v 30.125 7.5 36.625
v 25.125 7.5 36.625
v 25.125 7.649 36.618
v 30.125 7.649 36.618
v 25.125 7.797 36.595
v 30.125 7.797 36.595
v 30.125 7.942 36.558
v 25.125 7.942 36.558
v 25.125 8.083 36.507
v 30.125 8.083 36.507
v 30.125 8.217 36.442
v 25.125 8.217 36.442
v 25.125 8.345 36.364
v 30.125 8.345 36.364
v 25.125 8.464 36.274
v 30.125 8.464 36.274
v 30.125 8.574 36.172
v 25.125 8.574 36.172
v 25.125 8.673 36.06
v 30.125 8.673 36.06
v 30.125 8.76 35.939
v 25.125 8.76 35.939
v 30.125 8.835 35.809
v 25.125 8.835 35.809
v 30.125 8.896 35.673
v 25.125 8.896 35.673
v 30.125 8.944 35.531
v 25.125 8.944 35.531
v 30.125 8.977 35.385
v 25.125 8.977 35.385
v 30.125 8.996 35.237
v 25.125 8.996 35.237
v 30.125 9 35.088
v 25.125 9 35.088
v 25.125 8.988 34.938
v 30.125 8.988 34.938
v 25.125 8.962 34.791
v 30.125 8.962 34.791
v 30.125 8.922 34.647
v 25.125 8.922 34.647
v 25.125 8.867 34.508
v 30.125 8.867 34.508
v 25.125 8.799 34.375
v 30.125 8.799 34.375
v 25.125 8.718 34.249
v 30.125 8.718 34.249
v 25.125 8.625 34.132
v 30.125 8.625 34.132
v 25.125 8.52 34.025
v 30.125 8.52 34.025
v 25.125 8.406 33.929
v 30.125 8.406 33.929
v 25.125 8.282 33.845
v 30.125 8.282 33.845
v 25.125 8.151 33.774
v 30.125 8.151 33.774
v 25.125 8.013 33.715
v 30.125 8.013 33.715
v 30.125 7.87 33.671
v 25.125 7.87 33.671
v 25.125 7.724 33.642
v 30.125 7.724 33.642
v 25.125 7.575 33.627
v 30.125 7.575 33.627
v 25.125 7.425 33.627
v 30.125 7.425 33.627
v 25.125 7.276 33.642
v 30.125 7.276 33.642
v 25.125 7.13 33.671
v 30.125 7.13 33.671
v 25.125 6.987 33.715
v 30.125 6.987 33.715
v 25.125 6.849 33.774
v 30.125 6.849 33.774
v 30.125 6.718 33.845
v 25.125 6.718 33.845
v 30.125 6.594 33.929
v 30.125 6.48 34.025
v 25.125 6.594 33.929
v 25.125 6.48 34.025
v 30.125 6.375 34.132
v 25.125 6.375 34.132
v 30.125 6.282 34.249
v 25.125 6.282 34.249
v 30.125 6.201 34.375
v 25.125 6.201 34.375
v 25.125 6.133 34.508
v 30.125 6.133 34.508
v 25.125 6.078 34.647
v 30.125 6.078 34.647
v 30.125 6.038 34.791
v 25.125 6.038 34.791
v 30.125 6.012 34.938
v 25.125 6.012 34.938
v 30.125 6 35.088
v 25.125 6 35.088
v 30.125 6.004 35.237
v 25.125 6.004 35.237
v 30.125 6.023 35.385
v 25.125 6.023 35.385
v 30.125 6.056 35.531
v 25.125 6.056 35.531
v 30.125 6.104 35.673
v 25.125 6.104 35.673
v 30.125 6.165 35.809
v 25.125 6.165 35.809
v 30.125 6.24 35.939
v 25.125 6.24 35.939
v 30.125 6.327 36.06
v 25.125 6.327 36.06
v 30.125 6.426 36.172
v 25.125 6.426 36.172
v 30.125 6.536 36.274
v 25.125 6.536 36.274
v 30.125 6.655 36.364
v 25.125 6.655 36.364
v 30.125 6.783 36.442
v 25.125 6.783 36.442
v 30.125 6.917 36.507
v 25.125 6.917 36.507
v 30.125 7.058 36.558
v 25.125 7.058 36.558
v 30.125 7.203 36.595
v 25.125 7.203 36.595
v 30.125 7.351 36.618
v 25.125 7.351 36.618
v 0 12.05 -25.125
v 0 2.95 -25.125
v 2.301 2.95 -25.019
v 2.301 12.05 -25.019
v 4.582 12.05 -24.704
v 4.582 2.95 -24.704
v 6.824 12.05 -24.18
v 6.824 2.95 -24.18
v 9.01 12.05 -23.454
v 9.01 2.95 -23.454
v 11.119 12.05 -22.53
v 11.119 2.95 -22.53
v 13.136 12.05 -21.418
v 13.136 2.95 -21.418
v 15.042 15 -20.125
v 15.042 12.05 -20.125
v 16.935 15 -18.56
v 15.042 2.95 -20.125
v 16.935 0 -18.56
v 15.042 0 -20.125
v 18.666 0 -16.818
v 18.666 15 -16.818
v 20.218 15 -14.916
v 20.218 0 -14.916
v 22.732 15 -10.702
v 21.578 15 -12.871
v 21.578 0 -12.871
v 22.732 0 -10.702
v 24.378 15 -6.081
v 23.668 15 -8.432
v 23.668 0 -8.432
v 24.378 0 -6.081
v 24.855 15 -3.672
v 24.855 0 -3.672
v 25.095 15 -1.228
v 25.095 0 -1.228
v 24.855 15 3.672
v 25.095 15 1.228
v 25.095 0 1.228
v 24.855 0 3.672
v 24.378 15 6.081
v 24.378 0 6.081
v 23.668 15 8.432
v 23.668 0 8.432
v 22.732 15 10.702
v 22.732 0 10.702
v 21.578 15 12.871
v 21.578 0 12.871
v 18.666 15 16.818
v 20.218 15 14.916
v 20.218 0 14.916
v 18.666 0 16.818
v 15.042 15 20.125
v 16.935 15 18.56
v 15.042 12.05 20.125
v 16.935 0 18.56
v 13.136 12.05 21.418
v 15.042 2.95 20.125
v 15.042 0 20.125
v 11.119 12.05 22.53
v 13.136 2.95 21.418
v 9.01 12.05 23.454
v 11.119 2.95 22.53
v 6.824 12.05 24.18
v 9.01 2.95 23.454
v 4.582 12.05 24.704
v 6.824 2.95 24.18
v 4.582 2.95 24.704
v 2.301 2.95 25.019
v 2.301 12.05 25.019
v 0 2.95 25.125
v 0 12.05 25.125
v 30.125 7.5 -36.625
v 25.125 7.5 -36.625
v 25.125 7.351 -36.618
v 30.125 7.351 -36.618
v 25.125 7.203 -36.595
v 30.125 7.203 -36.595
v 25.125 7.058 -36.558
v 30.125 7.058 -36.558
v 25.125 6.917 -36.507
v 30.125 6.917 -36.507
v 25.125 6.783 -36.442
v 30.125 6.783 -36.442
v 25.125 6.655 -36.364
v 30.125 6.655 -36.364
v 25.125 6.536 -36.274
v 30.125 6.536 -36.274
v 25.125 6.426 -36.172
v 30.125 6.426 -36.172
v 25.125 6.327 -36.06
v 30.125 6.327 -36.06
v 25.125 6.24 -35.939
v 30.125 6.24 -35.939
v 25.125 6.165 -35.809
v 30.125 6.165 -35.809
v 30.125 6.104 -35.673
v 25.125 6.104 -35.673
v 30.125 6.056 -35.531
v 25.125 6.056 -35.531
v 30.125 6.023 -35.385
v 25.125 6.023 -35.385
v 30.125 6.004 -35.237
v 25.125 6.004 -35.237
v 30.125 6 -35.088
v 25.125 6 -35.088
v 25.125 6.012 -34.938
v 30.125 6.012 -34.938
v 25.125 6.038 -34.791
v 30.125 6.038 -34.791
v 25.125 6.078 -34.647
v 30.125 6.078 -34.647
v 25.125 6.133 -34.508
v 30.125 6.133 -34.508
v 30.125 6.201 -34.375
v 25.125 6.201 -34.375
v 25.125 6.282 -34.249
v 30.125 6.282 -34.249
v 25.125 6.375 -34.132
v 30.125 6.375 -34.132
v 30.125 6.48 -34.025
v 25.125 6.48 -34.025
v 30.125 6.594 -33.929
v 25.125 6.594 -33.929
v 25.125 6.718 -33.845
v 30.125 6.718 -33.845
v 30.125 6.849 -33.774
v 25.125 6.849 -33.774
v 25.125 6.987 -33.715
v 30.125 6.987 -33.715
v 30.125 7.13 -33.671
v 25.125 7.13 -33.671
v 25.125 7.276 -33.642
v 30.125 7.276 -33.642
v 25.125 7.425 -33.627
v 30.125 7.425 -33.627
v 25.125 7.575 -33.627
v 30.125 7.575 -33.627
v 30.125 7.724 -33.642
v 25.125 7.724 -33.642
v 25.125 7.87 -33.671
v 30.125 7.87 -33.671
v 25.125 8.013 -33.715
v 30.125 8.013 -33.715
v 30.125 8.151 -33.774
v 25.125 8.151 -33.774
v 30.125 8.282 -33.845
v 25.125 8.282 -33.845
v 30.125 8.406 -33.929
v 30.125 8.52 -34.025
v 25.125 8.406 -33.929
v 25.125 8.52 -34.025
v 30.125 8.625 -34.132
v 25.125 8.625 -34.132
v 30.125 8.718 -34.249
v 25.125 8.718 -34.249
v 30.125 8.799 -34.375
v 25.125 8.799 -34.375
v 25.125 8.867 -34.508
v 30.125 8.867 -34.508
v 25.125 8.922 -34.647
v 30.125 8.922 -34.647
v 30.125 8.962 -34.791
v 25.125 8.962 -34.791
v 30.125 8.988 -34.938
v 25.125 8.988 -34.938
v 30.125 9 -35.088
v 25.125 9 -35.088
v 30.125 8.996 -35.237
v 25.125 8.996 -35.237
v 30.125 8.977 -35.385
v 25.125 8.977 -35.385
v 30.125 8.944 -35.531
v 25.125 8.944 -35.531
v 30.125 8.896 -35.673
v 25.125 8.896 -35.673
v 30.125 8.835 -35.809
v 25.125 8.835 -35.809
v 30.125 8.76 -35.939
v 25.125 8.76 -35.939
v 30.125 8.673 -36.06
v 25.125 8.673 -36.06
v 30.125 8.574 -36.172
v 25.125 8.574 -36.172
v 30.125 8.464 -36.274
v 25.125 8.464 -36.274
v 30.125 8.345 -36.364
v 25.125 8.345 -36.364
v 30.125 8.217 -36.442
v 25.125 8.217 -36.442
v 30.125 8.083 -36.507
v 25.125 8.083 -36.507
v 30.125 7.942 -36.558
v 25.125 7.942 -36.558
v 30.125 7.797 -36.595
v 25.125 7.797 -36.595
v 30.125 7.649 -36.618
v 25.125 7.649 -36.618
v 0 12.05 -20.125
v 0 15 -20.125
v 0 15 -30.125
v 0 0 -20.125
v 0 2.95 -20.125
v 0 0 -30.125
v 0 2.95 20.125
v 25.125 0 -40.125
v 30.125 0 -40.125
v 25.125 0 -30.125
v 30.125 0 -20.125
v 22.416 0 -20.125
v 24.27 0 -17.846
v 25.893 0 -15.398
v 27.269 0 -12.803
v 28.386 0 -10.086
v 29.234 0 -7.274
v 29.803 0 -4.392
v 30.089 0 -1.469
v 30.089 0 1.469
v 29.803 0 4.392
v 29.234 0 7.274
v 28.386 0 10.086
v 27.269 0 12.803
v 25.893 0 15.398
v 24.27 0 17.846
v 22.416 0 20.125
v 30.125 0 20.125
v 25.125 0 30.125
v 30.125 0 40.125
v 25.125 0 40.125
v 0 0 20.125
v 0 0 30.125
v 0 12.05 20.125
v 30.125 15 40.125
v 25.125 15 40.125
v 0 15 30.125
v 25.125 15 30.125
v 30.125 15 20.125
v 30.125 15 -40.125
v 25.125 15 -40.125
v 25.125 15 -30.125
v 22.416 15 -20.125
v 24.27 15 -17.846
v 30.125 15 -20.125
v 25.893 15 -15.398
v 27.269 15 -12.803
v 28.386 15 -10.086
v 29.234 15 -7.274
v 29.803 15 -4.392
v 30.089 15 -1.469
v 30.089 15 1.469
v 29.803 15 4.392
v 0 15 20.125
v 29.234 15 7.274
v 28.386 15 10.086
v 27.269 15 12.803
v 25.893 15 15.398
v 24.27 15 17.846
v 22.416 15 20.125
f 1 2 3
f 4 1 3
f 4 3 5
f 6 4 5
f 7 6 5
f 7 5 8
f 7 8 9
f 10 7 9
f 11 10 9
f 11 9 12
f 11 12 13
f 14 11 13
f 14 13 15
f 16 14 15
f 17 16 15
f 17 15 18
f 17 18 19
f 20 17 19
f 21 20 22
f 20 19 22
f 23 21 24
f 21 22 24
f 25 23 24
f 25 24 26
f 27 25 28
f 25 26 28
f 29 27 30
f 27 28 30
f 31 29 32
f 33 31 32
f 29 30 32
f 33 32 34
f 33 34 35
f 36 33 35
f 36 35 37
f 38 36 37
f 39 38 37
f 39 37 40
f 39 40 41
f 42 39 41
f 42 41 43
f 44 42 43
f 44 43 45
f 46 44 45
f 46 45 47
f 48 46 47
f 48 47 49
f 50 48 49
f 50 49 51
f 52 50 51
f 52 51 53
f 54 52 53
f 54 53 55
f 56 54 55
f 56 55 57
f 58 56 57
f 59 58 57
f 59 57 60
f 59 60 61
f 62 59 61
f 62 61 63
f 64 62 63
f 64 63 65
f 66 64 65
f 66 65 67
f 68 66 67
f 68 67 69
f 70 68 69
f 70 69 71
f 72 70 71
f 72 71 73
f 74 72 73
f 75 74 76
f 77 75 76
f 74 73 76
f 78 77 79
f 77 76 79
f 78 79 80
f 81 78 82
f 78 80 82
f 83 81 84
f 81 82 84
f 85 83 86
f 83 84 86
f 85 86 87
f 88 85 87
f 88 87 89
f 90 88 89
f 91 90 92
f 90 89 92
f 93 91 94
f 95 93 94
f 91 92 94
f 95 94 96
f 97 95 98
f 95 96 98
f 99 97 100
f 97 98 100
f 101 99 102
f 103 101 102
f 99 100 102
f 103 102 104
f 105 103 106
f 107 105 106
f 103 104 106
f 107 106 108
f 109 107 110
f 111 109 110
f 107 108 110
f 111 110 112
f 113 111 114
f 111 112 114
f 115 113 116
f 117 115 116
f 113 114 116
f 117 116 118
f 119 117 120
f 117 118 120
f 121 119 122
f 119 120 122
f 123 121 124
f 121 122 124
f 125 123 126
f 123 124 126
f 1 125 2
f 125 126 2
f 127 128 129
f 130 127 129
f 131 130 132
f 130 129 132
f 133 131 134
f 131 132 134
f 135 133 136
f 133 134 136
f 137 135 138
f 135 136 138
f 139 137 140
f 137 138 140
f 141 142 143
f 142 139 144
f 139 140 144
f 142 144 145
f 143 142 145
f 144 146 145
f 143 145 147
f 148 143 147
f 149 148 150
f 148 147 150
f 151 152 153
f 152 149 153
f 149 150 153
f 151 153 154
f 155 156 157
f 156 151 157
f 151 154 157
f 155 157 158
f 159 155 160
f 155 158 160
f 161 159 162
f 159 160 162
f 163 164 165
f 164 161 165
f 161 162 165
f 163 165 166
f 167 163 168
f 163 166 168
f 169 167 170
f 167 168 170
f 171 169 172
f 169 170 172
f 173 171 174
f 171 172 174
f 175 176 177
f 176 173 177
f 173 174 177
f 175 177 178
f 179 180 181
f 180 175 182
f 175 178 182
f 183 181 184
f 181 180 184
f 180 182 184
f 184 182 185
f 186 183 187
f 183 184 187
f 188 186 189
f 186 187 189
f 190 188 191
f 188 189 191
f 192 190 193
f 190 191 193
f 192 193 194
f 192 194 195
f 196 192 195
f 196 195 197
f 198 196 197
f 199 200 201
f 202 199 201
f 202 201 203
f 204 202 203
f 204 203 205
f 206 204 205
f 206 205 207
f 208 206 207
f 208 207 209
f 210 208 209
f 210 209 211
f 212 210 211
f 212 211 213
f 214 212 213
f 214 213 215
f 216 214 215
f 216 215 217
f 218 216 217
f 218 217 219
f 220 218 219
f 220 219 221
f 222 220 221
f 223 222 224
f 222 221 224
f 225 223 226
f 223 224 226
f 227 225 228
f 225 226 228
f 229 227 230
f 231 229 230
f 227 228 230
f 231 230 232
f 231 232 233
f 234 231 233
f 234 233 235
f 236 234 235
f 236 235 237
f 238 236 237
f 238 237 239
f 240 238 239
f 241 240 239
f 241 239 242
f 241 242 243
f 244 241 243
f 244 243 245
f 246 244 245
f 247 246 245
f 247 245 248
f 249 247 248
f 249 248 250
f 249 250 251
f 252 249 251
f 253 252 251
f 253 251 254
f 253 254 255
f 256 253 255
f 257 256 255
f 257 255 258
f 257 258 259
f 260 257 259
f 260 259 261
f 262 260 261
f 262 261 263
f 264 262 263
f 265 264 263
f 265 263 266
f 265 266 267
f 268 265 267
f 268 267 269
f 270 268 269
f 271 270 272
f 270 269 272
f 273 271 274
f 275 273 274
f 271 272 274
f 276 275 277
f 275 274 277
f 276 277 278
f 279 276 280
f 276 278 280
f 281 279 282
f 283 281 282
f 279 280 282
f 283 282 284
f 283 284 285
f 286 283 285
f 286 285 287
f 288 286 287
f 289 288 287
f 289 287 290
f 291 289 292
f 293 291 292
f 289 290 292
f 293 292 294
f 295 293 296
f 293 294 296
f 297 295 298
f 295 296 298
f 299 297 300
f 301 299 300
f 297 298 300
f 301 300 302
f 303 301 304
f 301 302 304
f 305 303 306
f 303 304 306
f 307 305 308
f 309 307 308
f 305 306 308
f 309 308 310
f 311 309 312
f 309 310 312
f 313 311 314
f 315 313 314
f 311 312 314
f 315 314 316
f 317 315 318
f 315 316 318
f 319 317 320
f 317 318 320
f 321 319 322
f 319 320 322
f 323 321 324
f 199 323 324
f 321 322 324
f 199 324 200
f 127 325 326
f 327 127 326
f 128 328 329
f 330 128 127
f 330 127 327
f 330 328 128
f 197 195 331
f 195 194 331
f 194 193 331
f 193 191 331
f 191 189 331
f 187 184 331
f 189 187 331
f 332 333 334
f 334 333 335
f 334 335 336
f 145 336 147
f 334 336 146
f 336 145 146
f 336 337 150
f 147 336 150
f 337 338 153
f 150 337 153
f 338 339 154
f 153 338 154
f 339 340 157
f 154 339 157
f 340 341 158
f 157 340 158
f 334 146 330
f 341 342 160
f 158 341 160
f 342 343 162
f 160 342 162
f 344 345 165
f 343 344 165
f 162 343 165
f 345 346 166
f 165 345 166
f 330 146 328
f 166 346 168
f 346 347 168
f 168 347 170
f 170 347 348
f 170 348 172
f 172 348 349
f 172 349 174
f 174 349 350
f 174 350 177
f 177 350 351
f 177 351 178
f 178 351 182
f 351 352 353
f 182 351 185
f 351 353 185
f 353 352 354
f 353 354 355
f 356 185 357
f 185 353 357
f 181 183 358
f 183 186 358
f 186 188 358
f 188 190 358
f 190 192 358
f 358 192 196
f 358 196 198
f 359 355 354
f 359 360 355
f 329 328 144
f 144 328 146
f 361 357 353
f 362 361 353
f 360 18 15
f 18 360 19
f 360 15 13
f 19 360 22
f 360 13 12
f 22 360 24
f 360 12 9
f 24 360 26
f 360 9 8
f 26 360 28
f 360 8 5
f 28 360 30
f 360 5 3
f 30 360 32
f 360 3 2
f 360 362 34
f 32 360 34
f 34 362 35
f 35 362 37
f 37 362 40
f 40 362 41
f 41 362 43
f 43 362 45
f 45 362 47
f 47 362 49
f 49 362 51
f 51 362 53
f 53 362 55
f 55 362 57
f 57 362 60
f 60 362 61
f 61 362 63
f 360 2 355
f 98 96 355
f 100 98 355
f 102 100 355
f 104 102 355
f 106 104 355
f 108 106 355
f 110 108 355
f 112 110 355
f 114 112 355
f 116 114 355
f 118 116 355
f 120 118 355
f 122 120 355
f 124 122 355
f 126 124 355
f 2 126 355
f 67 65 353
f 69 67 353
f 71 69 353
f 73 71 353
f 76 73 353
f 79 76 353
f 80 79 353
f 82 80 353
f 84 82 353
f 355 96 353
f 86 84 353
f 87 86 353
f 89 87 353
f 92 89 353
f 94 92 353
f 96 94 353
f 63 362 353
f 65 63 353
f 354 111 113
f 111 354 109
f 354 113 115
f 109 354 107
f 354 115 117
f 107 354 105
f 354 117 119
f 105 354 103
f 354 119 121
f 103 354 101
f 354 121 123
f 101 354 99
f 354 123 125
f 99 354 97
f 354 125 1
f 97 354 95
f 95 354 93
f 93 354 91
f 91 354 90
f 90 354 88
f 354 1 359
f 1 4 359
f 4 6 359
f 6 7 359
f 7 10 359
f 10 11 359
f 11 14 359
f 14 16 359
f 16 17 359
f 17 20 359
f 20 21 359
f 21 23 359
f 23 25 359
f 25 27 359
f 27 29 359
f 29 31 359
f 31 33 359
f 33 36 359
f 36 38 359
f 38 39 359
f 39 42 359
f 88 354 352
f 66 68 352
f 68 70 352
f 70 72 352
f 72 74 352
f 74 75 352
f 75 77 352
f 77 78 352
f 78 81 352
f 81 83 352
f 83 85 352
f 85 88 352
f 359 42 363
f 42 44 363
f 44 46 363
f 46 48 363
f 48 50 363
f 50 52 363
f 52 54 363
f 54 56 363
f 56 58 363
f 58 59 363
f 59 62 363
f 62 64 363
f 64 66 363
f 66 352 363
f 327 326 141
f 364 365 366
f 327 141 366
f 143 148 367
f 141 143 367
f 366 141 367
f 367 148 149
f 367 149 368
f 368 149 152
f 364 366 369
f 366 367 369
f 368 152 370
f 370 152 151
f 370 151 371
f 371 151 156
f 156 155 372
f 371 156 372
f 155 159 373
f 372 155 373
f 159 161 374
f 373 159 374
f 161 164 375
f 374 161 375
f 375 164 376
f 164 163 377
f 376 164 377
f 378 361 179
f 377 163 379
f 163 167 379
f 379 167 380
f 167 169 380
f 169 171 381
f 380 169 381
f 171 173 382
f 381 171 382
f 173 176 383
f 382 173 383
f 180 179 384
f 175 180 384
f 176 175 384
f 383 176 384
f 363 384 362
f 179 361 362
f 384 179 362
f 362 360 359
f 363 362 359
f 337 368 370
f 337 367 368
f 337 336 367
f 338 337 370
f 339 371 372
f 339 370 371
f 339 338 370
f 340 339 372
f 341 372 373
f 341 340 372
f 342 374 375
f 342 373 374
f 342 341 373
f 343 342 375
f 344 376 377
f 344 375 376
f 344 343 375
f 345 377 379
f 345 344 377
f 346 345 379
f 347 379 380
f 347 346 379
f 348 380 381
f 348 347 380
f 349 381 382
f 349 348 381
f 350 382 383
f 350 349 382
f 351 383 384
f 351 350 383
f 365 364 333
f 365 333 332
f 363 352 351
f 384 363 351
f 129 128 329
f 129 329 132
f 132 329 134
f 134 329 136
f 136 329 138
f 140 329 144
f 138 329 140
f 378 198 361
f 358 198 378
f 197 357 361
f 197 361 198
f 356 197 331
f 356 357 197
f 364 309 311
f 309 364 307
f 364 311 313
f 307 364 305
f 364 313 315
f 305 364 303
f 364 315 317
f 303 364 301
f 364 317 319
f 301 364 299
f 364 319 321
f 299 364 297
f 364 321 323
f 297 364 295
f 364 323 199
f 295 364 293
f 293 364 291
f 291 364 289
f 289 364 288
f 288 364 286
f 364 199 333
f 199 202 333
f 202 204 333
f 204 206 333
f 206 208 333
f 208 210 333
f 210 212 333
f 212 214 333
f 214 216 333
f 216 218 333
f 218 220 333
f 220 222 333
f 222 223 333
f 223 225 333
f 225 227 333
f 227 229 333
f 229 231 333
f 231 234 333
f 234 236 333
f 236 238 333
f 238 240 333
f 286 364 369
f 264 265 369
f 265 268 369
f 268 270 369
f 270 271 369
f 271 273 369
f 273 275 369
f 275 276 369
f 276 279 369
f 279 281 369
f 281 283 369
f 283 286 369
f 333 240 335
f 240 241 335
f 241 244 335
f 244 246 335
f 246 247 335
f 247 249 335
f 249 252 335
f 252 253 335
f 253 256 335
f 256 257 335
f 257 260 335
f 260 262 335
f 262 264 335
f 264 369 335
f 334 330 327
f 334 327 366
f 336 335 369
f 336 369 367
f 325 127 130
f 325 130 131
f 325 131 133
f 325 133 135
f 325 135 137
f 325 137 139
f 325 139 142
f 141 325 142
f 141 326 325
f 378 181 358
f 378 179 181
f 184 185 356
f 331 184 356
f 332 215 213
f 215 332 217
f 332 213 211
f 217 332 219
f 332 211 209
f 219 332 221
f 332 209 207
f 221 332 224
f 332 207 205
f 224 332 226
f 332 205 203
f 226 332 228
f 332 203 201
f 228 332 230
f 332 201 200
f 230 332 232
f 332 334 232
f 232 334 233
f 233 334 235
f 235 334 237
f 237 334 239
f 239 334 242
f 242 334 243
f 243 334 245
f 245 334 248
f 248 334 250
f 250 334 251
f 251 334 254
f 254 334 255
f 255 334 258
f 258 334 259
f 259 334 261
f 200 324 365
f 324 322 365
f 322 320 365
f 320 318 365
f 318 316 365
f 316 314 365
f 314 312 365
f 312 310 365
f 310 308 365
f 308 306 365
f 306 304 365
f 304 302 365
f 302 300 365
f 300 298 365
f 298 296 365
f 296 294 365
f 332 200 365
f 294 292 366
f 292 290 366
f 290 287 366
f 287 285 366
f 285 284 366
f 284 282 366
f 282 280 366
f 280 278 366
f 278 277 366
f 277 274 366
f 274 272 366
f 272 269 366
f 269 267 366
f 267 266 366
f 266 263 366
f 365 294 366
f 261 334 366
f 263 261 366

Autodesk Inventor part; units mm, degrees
ref_plane "YZ Plane" through (0, 0, 0) normal (1, 0, 0) x (0, 1, 0)
ref_plane "XZ Plane" through (0, 0, 0) normal (0, 1, 0) x (-1, 0, 0)
ref_plane "XY Plane" through (0, 0, 0) normal (0, 0, 1) x (1, 0, 0)
sketch "Boceto1" plane through (0, 0, 0) normal (0, 1, 0) x (-1, 0, 0)
  arc A0 (0, 25.125) -> (0, -25.125) centre (0, 0) ccw
  arc A1 (0, 30.125) -> (0, -30.125) centre (0, 0) ccw
  line L0 (0, 30.125) -> (-30.125, 30.125)
  line L1 (-30.125, 30.125) -> (-30.125, 20.125)
  line L2 (-30.125, 20.125) -> (-22.4165, 20.125)
  line L3 (6.35, 0) -> (-9.525, 0)
  line L4 (0, -30.125) -> (-30.125, -30.125)
  line L5 (-30.125, -30.125) -> (-30.125, -20.125)
  line L6 (-30.125, -20.125) -> (-22.4165, -20.125)
  line L7 (0, 30.125) -> (0, 25.125)
  line L8 (0, -25.125) -> (0, -30.125)
  dimension "d0" = 50.25
  dimension "d1" = 5
  dimension "d2" = 10
extrude "Extrusión1" add sketch "Boceto1" along normal blind 15
sketch "Boceto2" plane through (0, 15, 0) normal (0, 1, 0) x (1, 0, 0)
  arc A0 (0, -25.125) -> (0, 25.125) centre (0, 0) ccw projected
  line L0 (0, 25.125) -> (0, 20.125)
  line L1 (0, 20.125) -> (15.0416, 20.125)
  dimension "d5" = 5
extrude "Extrusión2" add sketch "Boceto2" against normal blind 2.95
mirror "Simetría1" about plane through (0, 0, 0) normal (0, 0, 1) of "Extrusión2"
sketch "Boceto3" plane through (0, 0, 0) normal (0, -1, 0) x (1, 0, 0)
  arc A0 (0, -25.125) -> (15.0416, -20.125) centre (0, 0) ccw projected
  line L0 (0, -20.125) -> (0, -25.125) projected
  line L1 (0, -25.125) -> (0, -20.125)
  line L2 (0, -20.125) -> (15.0416, -20.125)
extrude "Extrusión3" add sketch "Boceto3" against normal blind 2.95
mirror "Simetría2" about plane through (0, 0, 0) normal (0, 0, 1) of "Extrusión3"
sketch "Boceto4" plane through (0, 0, 30.125) normal (0, 0, 1) x (1, 0, 0)
  line L0 (30.125, 0) -> (30.125, 15) projected
  line L1 (30.125, 15) -> (25.125, 15)
  line L2 (25.125, 15) -> (25.125, 0)
  line L3 (25.125, 0) -> (30.125, 0)
  line L4 (30.125, 0) -> (30.125, 15)
  point P0 (0, 0)
  dimension "d10" = 5
extrude "Extrusión4" add sketch "Boceto4" along normal blind 10
sketch "Boceto5" plane through (25.125, 0, 30.125) normal (-1, 0, 0) x (0, 0, 1)
  line L0 (-10, 15) -> (10, 15) projected
  line L1 (-10, 0) -> (0, 0) projected
  line L2 (10, 15) -> (0, 15)
  line L3 (0, 15) -> (0, 0)
  line L4 (0, 0) -> (10, 0)
  line L5 (10, 0) -> (10, 15)
  circle A0 centre (5, 7.5) radius 1.5
  point P0 (-30.125, 0)
  dimension "d13" = 3
extrude "Extrusión5" cut sketch "Boceto5" against normal blind 10 contours A0
mirror "Simetría3" about plane through (0, 0, 0) normal (0, 0, 1) of "Extrusión4", "Extrusión5"
properties part number "LensSupport" material "Plástico ABS"
